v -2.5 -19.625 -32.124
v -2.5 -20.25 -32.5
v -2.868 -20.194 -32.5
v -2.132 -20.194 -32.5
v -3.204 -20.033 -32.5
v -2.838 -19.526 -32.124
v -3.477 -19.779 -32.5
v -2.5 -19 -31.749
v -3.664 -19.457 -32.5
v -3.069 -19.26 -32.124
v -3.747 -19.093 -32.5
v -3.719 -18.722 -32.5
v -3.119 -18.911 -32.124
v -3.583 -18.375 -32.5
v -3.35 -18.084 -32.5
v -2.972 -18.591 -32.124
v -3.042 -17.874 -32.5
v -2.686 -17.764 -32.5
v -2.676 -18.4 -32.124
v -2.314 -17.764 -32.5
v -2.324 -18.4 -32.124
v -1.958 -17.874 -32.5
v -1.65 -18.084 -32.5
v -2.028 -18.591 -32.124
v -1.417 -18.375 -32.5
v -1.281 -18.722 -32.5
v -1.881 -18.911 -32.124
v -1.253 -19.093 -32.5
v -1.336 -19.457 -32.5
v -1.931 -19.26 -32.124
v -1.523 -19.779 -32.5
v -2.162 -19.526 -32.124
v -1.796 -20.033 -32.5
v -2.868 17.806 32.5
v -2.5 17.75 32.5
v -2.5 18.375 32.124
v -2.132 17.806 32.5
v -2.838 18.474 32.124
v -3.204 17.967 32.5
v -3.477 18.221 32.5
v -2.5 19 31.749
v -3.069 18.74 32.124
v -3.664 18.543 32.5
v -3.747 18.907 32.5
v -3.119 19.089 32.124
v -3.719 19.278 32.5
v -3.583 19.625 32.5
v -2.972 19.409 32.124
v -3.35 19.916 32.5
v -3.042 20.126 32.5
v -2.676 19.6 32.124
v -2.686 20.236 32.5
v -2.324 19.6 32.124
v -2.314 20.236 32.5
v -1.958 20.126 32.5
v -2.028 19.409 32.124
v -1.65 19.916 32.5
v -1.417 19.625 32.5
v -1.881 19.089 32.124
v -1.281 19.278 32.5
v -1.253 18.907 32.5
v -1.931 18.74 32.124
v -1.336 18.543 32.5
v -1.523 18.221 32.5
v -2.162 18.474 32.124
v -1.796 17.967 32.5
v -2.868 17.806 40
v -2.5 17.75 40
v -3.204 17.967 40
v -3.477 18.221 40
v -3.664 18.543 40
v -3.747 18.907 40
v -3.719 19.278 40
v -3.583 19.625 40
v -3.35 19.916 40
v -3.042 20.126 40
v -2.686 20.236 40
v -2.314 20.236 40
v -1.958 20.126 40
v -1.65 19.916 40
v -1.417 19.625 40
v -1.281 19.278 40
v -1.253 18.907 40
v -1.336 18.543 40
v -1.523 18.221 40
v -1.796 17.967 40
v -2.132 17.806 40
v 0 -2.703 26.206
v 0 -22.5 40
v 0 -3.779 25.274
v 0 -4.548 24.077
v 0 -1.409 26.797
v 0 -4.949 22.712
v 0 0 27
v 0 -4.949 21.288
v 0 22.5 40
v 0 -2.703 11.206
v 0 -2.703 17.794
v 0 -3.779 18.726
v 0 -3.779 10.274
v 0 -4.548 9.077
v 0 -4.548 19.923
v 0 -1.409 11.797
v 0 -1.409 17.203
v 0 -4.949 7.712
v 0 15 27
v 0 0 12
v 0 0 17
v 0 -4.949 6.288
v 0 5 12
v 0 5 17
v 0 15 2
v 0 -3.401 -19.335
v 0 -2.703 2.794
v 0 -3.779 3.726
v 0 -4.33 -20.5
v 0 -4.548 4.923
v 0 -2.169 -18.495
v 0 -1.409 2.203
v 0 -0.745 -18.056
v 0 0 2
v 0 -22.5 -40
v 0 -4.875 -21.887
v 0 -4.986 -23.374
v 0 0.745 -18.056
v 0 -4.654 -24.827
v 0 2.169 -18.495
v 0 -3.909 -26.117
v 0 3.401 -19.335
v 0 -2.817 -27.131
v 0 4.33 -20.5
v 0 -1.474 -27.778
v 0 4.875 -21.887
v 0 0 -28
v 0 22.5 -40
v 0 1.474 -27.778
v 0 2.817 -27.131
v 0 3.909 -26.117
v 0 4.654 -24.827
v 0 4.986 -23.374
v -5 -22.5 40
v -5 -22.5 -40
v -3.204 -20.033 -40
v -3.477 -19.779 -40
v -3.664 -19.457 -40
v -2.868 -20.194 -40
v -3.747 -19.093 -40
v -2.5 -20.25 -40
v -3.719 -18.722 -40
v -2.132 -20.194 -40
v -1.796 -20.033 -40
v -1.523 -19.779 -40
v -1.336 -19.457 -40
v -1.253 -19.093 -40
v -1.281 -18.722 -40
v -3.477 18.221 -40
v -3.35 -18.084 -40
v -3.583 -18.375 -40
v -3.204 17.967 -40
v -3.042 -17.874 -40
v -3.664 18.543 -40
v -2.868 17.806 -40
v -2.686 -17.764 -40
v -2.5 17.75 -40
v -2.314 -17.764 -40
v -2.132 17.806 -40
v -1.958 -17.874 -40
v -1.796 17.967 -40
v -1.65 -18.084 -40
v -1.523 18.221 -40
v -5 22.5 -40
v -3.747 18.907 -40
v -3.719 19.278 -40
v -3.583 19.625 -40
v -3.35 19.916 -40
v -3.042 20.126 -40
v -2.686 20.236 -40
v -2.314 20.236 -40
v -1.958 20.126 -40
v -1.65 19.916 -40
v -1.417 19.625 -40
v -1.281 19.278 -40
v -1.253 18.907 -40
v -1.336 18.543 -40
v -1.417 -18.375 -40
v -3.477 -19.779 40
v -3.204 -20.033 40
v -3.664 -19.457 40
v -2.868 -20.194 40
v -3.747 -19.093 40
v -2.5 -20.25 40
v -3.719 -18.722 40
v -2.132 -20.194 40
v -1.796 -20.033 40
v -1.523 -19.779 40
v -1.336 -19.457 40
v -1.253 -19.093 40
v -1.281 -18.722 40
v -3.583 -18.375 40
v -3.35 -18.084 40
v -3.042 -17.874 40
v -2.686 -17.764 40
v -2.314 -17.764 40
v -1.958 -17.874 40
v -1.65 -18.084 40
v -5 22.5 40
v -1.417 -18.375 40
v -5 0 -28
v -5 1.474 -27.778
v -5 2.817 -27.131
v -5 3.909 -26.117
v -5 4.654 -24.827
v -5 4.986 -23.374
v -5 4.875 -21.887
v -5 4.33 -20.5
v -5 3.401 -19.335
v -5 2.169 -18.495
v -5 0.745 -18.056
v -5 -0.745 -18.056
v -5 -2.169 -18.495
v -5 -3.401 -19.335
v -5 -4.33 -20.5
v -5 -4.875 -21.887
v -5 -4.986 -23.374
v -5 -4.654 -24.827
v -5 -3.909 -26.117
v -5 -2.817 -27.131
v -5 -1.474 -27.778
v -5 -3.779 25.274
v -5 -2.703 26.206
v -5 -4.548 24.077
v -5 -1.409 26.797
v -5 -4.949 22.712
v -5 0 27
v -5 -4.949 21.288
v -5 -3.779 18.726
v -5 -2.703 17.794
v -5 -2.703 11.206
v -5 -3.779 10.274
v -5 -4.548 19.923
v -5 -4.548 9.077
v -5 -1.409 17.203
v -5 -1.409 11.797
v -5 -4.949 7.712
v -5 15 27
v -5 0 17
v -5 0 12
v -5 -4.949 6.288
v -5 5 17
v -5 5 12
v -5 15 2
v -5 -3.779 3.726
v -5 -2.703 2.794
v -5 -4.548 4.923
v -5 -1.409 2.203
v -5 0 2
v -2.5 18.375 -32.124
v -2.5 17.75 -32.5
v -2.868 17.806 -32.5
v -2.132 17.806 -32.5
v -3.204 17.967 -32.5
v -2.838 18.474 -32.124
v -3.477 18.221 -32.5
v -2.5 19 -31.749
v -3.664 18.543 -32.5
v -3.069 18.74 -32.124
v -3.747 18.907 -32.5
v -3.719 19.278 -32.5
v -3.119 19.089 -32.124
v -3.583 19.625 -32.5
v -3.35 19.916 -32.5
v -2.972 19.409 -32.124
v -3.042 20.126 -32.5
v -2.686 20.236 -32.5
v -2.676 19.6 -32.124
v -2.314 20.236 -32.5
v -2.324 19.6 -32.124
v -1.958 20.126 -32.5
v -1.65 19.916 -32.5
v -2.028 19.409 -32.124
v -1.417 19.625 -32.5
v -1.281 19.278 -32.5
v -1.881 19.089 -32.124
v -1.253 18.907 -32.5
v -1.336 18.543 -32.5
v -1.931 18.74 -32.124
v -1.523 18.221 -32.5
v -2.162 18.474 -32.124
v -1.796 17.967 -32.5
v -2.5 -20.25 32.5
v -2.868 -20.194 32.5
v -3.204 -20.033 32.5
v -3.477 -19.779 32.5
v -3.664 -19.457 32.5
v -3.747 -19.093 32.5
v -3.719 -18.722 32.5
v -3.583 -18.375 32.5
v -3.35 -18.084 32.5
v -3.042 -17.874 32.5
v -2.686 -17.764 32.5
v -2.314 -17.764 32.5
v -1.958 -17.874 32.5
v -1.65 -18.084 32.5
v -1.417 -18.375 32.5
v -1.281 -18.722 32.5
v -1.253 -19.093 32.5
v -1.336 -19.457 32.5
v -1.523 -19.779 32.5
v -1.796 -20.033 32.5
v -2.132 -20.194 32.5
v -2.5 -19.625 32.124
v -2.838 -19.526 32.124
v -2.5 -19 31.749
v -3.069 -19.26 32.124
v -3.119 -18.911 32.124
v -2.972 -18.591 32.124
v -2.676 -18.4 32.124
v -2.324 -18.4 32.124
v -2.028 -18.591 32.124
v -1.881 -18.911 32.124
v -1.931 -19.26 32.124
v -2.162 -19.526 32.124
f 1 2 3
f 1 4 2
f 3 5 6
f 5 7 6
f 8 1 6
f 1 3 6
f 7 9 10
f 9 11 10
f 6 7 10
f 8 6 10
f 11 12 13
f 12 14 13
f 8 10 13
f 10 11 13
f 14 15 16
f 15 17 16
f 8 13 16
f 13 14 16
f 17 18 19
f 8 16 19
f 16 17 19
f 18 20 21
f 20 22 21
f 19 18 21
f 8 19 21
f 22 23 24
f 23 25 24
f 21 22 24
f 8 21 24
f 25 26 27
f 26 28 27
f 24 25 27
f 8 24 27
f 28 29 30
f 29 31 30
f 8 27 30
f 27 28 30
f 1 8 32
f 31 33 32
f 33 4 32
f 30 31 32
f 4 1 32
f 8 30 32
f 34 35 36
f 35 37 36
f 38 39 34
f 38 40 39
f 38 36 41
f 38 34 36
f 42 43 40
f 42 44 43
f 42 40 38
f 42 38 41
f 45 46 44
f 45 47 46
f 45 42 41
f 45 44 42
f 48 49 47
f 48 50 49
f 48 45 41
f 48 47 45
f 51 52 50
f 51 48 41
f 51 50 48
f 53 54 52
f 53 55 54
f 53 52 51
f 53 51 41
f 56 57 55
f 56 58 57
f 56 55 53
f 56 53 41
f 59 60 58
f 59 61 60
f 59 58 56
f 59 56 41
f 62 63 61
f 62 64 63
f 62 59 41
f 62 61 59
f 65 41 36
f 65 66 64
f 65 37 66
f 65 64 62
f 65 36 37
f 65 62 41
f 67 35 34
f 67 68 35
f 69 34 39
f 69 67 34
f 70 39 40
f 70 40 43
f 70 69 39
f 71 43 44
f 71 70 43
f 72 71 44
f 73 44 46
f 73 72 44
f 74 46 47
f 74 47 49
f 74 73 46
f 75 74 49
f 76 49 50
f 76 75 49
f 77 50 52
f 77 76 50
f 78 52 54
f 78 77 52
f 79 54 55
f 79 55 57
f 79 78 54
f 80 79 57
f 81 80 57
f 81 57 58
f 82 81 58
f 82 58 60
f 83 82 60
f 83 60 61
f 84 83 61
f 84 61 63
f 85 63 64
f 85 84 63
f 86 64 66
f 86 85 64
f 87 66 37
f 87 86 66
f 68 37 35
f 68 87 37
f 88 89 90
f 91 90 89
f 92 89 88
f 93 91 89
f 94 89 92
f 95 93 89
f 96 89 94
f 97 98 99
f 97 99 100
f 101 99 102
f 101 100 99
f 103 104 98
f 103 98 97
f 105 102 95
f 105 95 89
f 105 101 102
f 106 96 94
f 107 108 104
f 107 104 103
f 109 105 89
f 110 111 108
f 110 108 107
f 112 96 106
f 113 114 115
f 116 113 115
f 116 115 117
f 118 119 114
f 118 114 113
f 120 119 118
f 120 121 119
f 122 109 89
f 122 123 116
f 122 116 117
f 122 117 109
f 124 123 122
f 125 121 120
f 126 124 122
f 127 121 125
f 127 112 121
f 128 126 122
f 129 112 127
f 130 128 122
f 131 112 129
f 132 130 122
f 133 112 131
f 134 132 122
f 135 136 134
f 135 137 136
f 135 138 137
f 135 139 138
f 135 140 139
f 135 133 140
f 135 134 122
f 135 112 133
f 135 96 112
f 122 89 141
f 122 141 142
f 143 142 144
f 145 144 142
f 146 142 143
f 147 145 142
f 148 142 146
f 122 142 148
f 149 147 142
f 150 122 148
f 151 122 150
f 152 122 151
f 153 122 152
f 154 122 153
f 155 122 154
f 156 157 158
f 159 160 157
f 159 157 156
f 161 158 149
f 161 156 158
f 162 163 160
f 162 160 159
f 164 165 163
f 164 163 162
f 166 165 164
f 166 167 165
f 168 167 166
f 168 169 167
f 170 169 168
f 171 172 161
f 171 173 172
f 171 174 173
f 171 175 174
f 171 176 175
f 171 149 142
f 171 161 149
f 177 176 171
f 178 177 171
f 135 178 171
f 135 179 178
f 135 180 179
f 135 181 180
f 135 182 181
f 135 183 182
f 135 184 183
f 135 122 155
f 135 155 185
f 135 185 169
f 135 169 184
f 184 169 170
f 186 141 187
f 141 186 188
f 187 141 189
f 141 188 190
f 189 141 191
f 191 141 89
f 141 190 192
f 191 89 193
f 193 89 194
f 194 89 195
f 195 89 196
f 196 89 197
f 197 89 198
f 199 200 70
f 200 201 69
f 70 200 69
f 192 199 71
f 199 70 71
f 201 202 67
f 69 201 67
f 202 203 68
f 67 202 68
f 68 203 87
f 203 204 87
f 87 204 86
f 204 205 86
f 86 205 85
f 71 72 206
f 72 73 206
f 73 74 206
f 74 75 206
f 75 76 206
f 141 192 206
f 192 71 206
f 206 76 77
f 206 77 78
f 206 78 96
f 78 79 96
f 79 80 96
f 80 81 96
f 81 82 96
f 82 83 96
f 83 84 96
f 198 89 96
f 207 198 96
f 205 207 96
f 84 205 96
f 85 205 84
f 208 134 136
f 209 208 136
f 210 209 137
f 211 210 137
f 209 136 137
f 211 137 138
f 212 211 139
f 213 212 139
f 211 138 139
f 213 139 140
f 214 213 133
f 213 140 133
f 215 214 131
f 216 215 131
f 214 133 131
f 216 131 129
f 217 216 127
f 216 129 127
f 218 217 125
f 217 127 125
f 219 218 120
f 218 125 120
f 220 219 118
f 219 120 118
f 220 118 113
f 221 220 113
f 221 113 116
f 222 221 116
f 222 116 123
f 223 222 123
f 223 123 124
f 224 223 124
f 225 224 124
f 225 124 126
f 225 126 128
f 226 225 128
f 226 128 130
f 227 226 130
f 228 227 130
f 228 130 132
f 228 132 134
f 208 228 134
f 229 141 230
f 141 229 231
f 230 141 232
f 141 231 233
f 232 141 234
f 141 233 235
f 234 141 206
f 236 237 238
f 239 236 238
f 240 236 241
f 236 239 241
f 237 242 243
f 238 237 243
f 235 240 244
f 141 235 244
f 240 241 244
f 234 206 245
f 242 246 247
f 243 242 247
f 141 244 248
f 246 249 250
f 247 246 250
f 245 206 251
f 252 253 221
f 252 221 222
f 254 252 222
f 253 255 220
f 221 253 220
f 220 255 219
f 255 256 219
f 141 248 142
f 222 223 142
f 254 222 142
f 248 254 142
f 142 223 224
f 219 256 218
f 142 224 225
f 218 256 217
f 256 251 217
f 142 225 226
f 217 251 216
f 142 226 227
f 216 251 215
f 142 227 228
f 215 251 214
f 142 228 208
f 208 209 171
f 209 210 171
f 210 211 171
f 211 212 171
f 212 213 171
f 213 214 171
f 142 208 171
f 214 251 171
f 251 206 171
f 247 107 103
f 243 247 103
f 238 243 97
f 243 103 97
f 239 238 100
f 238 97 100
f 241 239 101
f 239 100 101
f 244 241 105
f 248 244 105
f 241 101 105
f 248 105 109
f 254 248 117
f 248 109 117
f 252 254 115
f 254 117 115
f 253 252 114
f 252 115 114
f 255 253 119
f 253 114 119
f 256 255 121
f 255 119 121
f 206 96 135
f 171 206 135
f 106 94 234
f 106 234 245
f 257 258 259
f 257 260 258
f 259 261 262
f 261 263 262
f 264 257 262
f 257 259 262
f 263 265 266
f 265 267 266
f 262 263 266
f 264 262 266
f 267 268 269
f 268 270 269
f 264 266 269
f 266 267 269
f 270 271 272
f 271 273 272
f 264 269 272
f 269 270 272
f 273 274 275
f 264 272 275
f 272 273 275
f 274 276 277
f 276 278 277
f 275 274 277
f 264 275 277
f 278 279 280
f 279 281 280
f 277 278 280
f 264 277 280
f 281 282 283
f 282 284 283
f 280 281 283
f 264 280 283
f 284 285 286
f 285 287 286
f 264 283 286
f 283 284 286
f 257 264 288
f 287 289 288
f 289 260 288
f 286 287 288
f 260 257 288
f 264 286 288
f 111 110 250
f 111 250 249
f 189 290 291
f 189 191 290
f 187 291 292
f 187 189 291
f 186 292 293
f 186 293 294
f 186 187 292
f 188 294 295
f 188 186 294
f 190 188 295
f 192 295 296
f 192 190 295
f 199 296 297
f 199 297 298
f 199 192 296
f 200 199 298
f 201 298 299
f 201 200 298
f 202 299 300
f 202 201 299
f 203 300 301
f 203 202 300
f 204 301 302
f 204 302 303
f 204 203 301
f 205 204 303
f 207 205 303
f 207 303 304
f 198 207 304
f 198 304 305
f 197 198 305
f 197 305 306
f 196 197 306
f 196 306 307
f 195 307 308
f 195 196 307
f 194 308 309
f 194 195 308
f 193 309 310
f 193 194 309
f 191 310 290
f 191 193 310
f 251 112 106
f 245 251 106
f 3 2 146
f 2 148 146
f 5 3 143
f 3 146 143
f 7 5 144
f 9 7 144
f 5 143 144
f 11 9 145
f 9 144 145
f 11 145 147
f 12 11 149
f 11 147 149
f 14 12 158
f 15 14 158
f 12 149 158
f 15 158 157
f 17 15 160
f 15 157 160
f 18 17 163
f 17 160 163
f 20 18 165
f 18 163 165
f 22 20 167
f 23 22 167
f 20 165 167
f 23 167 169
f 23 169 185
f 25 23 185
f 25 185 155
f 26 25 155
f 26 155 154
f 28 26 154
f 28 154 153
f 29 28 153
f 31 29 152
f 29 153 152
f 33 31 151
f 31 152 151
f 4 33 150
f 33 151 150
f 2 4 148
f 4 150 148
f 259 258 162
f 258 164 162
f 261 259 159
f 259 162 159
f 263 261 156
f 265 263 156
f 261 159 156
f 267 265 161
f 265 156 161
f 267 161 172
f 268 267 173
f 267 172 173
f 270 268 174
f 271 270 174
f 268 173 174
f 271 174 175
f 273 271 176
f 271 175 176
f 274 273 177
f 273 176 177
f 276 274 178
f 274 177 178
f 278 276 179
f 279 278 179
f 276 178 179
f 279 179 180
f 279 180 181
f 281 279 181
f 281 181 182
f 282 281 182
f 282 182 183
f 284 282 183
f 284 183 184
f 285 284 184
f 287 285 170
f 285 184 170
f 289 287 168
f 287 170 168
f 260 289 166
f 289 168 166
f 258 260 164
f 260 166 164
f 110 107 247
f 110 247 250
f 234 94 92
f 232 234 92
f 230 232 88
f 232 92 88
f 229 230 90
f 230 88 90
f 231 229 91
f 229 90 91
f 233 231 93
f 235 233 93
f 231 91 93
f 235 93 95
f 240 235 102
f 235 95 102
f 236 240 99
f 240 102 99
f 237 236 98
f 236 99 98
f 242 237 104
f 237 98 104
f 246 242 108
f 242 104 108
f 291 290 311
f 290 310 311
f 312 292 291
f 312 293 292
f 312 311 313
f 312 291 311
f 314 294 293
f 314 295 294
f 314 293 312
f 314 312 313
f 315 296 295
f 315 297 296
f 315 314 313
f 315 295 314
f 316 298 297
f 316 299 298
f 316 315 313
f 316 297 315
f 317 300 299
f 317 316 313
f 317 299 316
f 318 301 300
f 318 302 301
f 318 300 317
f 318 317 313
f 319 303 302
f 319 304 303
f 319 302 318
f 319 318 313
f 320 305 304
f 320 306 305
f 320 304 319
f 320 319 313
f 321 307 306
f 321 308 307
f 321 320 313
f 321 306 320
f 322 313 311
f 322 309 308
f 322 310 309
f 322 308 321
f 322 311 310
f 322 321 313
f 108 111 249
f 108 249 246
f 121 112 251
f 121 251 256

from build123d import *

# Parameters (mm, degrees)
SKETCH_2_W                  = 80
SKETCH_2_H                  = 45
EXTRUDE_2_DEPTH             = 5
HOLE_WIZARD_M3_1_AT_2_COUNT = 2
HOLE_WIZARD_M3_1_AT_2_PITCH = 38
SKETCH_5_R                  = 5
CUT_EXTRUDE_1_DEPTH         = 10
CUT_EXTRUDE_2_DEPTH         = 10


with BuildPart() as part:
    # 草图2 → 凸台-拉伸2 (new body)
    with BuildSketch(Plane(origin=(0, 0, 0), x_dir=(0, 0, -1), z_dir=(1, 0, 0))):
        Rectangle(SKETCH_2_W, SKETCH_2_H)
    extrude(amount=-EXTRUDE_2_DEPTH)

    # 草图12 → M3 螺纹孔1 (revolve, cut)
    with BuildSketch(Plane(origin=(-2.5, 19, 40), x_dir=(0, -1, 0), z_dir=(1, 0, 0))):
        Polygon((0, 0), (0, 8.251075774), (1.25, 7.5), (1.25, 0), align=None)
    hole_wizard_m3_1 = revolve(axis=Axis((-2.5, 19, 46.35), (0, 0, -1)), mode=Mode.SUBTRACT)

    # M3 螺纹孔1 at 2: M3 螺纹孔1 ×2
    with Locations(*[(0, -i * HOLE_WIZARD_M3_1_AT_2_PITCH, 0) for i in range(1, HOLE_WIZARD_M3_1_AT_2_COUNT)]):
        add(hole_wizard_m3_1, mode=Mode.SUBTRACT)

    # 镜向1: M3 螺纹孔1 across plane
    add(hole_wizard_m3_1.mirror(Plane.XY), mode=Mode.SUBTRACT)

    # 镜向1 copy 1 sketch → 镜向1 copy 1 (revolve, cut)
    with BuildSketch(Plane(origin=(-2.5, -19, -40), x_dir=(0, -1, 0), z_dir=(1, 0, 0))):
        Polygon((0, 0), (0, -8.251075774), (1.25, -7.5), (1.25, 0), align=None)
    revolve(axis=Axis((-2.5, -19, -46.35), (0, 0, -1)), mode=Mode.SUBTRACT)

    # 草图5 → 切除-拉伸1 (cut)
    with BuildSketch(Plane(origin=(0, 0, 0), x_dir=(0, 0, -1), z_dir=(1, 0, 0))):
        with Locations((-7, 0)):
            Circle(SKETCH_5_R)
        with Locations((23, 0)):
            Circle(SKETCH_5_R)
        with Locations((-22, 0)):
            Circle(SKETCH_5_R)
    extrude(amount=-CUT_EXTRUDE_1_DEPTH, mode=Mode.SUBTRACT)

    # 草图13 → 切除-拉伸2 (cut)
    with BuildSketch(Plane(origin=(0, 0, 0), x_dir=(0, 0, -1), z_dir=(1, 0, 0))):
        Polygon((-27, 0), (-27, 15), (-13.340798137, 15), (-4.226787528, 15), (-2, 15), (-2, 0), (-12, 0), (-12, 5), (-17, 5), (-17, 0), align=None)
    extrude(amount=-CUT_EXTRUDE_2_DEPTH, mode=Mode.SUBTRACT)


solid = part.part
